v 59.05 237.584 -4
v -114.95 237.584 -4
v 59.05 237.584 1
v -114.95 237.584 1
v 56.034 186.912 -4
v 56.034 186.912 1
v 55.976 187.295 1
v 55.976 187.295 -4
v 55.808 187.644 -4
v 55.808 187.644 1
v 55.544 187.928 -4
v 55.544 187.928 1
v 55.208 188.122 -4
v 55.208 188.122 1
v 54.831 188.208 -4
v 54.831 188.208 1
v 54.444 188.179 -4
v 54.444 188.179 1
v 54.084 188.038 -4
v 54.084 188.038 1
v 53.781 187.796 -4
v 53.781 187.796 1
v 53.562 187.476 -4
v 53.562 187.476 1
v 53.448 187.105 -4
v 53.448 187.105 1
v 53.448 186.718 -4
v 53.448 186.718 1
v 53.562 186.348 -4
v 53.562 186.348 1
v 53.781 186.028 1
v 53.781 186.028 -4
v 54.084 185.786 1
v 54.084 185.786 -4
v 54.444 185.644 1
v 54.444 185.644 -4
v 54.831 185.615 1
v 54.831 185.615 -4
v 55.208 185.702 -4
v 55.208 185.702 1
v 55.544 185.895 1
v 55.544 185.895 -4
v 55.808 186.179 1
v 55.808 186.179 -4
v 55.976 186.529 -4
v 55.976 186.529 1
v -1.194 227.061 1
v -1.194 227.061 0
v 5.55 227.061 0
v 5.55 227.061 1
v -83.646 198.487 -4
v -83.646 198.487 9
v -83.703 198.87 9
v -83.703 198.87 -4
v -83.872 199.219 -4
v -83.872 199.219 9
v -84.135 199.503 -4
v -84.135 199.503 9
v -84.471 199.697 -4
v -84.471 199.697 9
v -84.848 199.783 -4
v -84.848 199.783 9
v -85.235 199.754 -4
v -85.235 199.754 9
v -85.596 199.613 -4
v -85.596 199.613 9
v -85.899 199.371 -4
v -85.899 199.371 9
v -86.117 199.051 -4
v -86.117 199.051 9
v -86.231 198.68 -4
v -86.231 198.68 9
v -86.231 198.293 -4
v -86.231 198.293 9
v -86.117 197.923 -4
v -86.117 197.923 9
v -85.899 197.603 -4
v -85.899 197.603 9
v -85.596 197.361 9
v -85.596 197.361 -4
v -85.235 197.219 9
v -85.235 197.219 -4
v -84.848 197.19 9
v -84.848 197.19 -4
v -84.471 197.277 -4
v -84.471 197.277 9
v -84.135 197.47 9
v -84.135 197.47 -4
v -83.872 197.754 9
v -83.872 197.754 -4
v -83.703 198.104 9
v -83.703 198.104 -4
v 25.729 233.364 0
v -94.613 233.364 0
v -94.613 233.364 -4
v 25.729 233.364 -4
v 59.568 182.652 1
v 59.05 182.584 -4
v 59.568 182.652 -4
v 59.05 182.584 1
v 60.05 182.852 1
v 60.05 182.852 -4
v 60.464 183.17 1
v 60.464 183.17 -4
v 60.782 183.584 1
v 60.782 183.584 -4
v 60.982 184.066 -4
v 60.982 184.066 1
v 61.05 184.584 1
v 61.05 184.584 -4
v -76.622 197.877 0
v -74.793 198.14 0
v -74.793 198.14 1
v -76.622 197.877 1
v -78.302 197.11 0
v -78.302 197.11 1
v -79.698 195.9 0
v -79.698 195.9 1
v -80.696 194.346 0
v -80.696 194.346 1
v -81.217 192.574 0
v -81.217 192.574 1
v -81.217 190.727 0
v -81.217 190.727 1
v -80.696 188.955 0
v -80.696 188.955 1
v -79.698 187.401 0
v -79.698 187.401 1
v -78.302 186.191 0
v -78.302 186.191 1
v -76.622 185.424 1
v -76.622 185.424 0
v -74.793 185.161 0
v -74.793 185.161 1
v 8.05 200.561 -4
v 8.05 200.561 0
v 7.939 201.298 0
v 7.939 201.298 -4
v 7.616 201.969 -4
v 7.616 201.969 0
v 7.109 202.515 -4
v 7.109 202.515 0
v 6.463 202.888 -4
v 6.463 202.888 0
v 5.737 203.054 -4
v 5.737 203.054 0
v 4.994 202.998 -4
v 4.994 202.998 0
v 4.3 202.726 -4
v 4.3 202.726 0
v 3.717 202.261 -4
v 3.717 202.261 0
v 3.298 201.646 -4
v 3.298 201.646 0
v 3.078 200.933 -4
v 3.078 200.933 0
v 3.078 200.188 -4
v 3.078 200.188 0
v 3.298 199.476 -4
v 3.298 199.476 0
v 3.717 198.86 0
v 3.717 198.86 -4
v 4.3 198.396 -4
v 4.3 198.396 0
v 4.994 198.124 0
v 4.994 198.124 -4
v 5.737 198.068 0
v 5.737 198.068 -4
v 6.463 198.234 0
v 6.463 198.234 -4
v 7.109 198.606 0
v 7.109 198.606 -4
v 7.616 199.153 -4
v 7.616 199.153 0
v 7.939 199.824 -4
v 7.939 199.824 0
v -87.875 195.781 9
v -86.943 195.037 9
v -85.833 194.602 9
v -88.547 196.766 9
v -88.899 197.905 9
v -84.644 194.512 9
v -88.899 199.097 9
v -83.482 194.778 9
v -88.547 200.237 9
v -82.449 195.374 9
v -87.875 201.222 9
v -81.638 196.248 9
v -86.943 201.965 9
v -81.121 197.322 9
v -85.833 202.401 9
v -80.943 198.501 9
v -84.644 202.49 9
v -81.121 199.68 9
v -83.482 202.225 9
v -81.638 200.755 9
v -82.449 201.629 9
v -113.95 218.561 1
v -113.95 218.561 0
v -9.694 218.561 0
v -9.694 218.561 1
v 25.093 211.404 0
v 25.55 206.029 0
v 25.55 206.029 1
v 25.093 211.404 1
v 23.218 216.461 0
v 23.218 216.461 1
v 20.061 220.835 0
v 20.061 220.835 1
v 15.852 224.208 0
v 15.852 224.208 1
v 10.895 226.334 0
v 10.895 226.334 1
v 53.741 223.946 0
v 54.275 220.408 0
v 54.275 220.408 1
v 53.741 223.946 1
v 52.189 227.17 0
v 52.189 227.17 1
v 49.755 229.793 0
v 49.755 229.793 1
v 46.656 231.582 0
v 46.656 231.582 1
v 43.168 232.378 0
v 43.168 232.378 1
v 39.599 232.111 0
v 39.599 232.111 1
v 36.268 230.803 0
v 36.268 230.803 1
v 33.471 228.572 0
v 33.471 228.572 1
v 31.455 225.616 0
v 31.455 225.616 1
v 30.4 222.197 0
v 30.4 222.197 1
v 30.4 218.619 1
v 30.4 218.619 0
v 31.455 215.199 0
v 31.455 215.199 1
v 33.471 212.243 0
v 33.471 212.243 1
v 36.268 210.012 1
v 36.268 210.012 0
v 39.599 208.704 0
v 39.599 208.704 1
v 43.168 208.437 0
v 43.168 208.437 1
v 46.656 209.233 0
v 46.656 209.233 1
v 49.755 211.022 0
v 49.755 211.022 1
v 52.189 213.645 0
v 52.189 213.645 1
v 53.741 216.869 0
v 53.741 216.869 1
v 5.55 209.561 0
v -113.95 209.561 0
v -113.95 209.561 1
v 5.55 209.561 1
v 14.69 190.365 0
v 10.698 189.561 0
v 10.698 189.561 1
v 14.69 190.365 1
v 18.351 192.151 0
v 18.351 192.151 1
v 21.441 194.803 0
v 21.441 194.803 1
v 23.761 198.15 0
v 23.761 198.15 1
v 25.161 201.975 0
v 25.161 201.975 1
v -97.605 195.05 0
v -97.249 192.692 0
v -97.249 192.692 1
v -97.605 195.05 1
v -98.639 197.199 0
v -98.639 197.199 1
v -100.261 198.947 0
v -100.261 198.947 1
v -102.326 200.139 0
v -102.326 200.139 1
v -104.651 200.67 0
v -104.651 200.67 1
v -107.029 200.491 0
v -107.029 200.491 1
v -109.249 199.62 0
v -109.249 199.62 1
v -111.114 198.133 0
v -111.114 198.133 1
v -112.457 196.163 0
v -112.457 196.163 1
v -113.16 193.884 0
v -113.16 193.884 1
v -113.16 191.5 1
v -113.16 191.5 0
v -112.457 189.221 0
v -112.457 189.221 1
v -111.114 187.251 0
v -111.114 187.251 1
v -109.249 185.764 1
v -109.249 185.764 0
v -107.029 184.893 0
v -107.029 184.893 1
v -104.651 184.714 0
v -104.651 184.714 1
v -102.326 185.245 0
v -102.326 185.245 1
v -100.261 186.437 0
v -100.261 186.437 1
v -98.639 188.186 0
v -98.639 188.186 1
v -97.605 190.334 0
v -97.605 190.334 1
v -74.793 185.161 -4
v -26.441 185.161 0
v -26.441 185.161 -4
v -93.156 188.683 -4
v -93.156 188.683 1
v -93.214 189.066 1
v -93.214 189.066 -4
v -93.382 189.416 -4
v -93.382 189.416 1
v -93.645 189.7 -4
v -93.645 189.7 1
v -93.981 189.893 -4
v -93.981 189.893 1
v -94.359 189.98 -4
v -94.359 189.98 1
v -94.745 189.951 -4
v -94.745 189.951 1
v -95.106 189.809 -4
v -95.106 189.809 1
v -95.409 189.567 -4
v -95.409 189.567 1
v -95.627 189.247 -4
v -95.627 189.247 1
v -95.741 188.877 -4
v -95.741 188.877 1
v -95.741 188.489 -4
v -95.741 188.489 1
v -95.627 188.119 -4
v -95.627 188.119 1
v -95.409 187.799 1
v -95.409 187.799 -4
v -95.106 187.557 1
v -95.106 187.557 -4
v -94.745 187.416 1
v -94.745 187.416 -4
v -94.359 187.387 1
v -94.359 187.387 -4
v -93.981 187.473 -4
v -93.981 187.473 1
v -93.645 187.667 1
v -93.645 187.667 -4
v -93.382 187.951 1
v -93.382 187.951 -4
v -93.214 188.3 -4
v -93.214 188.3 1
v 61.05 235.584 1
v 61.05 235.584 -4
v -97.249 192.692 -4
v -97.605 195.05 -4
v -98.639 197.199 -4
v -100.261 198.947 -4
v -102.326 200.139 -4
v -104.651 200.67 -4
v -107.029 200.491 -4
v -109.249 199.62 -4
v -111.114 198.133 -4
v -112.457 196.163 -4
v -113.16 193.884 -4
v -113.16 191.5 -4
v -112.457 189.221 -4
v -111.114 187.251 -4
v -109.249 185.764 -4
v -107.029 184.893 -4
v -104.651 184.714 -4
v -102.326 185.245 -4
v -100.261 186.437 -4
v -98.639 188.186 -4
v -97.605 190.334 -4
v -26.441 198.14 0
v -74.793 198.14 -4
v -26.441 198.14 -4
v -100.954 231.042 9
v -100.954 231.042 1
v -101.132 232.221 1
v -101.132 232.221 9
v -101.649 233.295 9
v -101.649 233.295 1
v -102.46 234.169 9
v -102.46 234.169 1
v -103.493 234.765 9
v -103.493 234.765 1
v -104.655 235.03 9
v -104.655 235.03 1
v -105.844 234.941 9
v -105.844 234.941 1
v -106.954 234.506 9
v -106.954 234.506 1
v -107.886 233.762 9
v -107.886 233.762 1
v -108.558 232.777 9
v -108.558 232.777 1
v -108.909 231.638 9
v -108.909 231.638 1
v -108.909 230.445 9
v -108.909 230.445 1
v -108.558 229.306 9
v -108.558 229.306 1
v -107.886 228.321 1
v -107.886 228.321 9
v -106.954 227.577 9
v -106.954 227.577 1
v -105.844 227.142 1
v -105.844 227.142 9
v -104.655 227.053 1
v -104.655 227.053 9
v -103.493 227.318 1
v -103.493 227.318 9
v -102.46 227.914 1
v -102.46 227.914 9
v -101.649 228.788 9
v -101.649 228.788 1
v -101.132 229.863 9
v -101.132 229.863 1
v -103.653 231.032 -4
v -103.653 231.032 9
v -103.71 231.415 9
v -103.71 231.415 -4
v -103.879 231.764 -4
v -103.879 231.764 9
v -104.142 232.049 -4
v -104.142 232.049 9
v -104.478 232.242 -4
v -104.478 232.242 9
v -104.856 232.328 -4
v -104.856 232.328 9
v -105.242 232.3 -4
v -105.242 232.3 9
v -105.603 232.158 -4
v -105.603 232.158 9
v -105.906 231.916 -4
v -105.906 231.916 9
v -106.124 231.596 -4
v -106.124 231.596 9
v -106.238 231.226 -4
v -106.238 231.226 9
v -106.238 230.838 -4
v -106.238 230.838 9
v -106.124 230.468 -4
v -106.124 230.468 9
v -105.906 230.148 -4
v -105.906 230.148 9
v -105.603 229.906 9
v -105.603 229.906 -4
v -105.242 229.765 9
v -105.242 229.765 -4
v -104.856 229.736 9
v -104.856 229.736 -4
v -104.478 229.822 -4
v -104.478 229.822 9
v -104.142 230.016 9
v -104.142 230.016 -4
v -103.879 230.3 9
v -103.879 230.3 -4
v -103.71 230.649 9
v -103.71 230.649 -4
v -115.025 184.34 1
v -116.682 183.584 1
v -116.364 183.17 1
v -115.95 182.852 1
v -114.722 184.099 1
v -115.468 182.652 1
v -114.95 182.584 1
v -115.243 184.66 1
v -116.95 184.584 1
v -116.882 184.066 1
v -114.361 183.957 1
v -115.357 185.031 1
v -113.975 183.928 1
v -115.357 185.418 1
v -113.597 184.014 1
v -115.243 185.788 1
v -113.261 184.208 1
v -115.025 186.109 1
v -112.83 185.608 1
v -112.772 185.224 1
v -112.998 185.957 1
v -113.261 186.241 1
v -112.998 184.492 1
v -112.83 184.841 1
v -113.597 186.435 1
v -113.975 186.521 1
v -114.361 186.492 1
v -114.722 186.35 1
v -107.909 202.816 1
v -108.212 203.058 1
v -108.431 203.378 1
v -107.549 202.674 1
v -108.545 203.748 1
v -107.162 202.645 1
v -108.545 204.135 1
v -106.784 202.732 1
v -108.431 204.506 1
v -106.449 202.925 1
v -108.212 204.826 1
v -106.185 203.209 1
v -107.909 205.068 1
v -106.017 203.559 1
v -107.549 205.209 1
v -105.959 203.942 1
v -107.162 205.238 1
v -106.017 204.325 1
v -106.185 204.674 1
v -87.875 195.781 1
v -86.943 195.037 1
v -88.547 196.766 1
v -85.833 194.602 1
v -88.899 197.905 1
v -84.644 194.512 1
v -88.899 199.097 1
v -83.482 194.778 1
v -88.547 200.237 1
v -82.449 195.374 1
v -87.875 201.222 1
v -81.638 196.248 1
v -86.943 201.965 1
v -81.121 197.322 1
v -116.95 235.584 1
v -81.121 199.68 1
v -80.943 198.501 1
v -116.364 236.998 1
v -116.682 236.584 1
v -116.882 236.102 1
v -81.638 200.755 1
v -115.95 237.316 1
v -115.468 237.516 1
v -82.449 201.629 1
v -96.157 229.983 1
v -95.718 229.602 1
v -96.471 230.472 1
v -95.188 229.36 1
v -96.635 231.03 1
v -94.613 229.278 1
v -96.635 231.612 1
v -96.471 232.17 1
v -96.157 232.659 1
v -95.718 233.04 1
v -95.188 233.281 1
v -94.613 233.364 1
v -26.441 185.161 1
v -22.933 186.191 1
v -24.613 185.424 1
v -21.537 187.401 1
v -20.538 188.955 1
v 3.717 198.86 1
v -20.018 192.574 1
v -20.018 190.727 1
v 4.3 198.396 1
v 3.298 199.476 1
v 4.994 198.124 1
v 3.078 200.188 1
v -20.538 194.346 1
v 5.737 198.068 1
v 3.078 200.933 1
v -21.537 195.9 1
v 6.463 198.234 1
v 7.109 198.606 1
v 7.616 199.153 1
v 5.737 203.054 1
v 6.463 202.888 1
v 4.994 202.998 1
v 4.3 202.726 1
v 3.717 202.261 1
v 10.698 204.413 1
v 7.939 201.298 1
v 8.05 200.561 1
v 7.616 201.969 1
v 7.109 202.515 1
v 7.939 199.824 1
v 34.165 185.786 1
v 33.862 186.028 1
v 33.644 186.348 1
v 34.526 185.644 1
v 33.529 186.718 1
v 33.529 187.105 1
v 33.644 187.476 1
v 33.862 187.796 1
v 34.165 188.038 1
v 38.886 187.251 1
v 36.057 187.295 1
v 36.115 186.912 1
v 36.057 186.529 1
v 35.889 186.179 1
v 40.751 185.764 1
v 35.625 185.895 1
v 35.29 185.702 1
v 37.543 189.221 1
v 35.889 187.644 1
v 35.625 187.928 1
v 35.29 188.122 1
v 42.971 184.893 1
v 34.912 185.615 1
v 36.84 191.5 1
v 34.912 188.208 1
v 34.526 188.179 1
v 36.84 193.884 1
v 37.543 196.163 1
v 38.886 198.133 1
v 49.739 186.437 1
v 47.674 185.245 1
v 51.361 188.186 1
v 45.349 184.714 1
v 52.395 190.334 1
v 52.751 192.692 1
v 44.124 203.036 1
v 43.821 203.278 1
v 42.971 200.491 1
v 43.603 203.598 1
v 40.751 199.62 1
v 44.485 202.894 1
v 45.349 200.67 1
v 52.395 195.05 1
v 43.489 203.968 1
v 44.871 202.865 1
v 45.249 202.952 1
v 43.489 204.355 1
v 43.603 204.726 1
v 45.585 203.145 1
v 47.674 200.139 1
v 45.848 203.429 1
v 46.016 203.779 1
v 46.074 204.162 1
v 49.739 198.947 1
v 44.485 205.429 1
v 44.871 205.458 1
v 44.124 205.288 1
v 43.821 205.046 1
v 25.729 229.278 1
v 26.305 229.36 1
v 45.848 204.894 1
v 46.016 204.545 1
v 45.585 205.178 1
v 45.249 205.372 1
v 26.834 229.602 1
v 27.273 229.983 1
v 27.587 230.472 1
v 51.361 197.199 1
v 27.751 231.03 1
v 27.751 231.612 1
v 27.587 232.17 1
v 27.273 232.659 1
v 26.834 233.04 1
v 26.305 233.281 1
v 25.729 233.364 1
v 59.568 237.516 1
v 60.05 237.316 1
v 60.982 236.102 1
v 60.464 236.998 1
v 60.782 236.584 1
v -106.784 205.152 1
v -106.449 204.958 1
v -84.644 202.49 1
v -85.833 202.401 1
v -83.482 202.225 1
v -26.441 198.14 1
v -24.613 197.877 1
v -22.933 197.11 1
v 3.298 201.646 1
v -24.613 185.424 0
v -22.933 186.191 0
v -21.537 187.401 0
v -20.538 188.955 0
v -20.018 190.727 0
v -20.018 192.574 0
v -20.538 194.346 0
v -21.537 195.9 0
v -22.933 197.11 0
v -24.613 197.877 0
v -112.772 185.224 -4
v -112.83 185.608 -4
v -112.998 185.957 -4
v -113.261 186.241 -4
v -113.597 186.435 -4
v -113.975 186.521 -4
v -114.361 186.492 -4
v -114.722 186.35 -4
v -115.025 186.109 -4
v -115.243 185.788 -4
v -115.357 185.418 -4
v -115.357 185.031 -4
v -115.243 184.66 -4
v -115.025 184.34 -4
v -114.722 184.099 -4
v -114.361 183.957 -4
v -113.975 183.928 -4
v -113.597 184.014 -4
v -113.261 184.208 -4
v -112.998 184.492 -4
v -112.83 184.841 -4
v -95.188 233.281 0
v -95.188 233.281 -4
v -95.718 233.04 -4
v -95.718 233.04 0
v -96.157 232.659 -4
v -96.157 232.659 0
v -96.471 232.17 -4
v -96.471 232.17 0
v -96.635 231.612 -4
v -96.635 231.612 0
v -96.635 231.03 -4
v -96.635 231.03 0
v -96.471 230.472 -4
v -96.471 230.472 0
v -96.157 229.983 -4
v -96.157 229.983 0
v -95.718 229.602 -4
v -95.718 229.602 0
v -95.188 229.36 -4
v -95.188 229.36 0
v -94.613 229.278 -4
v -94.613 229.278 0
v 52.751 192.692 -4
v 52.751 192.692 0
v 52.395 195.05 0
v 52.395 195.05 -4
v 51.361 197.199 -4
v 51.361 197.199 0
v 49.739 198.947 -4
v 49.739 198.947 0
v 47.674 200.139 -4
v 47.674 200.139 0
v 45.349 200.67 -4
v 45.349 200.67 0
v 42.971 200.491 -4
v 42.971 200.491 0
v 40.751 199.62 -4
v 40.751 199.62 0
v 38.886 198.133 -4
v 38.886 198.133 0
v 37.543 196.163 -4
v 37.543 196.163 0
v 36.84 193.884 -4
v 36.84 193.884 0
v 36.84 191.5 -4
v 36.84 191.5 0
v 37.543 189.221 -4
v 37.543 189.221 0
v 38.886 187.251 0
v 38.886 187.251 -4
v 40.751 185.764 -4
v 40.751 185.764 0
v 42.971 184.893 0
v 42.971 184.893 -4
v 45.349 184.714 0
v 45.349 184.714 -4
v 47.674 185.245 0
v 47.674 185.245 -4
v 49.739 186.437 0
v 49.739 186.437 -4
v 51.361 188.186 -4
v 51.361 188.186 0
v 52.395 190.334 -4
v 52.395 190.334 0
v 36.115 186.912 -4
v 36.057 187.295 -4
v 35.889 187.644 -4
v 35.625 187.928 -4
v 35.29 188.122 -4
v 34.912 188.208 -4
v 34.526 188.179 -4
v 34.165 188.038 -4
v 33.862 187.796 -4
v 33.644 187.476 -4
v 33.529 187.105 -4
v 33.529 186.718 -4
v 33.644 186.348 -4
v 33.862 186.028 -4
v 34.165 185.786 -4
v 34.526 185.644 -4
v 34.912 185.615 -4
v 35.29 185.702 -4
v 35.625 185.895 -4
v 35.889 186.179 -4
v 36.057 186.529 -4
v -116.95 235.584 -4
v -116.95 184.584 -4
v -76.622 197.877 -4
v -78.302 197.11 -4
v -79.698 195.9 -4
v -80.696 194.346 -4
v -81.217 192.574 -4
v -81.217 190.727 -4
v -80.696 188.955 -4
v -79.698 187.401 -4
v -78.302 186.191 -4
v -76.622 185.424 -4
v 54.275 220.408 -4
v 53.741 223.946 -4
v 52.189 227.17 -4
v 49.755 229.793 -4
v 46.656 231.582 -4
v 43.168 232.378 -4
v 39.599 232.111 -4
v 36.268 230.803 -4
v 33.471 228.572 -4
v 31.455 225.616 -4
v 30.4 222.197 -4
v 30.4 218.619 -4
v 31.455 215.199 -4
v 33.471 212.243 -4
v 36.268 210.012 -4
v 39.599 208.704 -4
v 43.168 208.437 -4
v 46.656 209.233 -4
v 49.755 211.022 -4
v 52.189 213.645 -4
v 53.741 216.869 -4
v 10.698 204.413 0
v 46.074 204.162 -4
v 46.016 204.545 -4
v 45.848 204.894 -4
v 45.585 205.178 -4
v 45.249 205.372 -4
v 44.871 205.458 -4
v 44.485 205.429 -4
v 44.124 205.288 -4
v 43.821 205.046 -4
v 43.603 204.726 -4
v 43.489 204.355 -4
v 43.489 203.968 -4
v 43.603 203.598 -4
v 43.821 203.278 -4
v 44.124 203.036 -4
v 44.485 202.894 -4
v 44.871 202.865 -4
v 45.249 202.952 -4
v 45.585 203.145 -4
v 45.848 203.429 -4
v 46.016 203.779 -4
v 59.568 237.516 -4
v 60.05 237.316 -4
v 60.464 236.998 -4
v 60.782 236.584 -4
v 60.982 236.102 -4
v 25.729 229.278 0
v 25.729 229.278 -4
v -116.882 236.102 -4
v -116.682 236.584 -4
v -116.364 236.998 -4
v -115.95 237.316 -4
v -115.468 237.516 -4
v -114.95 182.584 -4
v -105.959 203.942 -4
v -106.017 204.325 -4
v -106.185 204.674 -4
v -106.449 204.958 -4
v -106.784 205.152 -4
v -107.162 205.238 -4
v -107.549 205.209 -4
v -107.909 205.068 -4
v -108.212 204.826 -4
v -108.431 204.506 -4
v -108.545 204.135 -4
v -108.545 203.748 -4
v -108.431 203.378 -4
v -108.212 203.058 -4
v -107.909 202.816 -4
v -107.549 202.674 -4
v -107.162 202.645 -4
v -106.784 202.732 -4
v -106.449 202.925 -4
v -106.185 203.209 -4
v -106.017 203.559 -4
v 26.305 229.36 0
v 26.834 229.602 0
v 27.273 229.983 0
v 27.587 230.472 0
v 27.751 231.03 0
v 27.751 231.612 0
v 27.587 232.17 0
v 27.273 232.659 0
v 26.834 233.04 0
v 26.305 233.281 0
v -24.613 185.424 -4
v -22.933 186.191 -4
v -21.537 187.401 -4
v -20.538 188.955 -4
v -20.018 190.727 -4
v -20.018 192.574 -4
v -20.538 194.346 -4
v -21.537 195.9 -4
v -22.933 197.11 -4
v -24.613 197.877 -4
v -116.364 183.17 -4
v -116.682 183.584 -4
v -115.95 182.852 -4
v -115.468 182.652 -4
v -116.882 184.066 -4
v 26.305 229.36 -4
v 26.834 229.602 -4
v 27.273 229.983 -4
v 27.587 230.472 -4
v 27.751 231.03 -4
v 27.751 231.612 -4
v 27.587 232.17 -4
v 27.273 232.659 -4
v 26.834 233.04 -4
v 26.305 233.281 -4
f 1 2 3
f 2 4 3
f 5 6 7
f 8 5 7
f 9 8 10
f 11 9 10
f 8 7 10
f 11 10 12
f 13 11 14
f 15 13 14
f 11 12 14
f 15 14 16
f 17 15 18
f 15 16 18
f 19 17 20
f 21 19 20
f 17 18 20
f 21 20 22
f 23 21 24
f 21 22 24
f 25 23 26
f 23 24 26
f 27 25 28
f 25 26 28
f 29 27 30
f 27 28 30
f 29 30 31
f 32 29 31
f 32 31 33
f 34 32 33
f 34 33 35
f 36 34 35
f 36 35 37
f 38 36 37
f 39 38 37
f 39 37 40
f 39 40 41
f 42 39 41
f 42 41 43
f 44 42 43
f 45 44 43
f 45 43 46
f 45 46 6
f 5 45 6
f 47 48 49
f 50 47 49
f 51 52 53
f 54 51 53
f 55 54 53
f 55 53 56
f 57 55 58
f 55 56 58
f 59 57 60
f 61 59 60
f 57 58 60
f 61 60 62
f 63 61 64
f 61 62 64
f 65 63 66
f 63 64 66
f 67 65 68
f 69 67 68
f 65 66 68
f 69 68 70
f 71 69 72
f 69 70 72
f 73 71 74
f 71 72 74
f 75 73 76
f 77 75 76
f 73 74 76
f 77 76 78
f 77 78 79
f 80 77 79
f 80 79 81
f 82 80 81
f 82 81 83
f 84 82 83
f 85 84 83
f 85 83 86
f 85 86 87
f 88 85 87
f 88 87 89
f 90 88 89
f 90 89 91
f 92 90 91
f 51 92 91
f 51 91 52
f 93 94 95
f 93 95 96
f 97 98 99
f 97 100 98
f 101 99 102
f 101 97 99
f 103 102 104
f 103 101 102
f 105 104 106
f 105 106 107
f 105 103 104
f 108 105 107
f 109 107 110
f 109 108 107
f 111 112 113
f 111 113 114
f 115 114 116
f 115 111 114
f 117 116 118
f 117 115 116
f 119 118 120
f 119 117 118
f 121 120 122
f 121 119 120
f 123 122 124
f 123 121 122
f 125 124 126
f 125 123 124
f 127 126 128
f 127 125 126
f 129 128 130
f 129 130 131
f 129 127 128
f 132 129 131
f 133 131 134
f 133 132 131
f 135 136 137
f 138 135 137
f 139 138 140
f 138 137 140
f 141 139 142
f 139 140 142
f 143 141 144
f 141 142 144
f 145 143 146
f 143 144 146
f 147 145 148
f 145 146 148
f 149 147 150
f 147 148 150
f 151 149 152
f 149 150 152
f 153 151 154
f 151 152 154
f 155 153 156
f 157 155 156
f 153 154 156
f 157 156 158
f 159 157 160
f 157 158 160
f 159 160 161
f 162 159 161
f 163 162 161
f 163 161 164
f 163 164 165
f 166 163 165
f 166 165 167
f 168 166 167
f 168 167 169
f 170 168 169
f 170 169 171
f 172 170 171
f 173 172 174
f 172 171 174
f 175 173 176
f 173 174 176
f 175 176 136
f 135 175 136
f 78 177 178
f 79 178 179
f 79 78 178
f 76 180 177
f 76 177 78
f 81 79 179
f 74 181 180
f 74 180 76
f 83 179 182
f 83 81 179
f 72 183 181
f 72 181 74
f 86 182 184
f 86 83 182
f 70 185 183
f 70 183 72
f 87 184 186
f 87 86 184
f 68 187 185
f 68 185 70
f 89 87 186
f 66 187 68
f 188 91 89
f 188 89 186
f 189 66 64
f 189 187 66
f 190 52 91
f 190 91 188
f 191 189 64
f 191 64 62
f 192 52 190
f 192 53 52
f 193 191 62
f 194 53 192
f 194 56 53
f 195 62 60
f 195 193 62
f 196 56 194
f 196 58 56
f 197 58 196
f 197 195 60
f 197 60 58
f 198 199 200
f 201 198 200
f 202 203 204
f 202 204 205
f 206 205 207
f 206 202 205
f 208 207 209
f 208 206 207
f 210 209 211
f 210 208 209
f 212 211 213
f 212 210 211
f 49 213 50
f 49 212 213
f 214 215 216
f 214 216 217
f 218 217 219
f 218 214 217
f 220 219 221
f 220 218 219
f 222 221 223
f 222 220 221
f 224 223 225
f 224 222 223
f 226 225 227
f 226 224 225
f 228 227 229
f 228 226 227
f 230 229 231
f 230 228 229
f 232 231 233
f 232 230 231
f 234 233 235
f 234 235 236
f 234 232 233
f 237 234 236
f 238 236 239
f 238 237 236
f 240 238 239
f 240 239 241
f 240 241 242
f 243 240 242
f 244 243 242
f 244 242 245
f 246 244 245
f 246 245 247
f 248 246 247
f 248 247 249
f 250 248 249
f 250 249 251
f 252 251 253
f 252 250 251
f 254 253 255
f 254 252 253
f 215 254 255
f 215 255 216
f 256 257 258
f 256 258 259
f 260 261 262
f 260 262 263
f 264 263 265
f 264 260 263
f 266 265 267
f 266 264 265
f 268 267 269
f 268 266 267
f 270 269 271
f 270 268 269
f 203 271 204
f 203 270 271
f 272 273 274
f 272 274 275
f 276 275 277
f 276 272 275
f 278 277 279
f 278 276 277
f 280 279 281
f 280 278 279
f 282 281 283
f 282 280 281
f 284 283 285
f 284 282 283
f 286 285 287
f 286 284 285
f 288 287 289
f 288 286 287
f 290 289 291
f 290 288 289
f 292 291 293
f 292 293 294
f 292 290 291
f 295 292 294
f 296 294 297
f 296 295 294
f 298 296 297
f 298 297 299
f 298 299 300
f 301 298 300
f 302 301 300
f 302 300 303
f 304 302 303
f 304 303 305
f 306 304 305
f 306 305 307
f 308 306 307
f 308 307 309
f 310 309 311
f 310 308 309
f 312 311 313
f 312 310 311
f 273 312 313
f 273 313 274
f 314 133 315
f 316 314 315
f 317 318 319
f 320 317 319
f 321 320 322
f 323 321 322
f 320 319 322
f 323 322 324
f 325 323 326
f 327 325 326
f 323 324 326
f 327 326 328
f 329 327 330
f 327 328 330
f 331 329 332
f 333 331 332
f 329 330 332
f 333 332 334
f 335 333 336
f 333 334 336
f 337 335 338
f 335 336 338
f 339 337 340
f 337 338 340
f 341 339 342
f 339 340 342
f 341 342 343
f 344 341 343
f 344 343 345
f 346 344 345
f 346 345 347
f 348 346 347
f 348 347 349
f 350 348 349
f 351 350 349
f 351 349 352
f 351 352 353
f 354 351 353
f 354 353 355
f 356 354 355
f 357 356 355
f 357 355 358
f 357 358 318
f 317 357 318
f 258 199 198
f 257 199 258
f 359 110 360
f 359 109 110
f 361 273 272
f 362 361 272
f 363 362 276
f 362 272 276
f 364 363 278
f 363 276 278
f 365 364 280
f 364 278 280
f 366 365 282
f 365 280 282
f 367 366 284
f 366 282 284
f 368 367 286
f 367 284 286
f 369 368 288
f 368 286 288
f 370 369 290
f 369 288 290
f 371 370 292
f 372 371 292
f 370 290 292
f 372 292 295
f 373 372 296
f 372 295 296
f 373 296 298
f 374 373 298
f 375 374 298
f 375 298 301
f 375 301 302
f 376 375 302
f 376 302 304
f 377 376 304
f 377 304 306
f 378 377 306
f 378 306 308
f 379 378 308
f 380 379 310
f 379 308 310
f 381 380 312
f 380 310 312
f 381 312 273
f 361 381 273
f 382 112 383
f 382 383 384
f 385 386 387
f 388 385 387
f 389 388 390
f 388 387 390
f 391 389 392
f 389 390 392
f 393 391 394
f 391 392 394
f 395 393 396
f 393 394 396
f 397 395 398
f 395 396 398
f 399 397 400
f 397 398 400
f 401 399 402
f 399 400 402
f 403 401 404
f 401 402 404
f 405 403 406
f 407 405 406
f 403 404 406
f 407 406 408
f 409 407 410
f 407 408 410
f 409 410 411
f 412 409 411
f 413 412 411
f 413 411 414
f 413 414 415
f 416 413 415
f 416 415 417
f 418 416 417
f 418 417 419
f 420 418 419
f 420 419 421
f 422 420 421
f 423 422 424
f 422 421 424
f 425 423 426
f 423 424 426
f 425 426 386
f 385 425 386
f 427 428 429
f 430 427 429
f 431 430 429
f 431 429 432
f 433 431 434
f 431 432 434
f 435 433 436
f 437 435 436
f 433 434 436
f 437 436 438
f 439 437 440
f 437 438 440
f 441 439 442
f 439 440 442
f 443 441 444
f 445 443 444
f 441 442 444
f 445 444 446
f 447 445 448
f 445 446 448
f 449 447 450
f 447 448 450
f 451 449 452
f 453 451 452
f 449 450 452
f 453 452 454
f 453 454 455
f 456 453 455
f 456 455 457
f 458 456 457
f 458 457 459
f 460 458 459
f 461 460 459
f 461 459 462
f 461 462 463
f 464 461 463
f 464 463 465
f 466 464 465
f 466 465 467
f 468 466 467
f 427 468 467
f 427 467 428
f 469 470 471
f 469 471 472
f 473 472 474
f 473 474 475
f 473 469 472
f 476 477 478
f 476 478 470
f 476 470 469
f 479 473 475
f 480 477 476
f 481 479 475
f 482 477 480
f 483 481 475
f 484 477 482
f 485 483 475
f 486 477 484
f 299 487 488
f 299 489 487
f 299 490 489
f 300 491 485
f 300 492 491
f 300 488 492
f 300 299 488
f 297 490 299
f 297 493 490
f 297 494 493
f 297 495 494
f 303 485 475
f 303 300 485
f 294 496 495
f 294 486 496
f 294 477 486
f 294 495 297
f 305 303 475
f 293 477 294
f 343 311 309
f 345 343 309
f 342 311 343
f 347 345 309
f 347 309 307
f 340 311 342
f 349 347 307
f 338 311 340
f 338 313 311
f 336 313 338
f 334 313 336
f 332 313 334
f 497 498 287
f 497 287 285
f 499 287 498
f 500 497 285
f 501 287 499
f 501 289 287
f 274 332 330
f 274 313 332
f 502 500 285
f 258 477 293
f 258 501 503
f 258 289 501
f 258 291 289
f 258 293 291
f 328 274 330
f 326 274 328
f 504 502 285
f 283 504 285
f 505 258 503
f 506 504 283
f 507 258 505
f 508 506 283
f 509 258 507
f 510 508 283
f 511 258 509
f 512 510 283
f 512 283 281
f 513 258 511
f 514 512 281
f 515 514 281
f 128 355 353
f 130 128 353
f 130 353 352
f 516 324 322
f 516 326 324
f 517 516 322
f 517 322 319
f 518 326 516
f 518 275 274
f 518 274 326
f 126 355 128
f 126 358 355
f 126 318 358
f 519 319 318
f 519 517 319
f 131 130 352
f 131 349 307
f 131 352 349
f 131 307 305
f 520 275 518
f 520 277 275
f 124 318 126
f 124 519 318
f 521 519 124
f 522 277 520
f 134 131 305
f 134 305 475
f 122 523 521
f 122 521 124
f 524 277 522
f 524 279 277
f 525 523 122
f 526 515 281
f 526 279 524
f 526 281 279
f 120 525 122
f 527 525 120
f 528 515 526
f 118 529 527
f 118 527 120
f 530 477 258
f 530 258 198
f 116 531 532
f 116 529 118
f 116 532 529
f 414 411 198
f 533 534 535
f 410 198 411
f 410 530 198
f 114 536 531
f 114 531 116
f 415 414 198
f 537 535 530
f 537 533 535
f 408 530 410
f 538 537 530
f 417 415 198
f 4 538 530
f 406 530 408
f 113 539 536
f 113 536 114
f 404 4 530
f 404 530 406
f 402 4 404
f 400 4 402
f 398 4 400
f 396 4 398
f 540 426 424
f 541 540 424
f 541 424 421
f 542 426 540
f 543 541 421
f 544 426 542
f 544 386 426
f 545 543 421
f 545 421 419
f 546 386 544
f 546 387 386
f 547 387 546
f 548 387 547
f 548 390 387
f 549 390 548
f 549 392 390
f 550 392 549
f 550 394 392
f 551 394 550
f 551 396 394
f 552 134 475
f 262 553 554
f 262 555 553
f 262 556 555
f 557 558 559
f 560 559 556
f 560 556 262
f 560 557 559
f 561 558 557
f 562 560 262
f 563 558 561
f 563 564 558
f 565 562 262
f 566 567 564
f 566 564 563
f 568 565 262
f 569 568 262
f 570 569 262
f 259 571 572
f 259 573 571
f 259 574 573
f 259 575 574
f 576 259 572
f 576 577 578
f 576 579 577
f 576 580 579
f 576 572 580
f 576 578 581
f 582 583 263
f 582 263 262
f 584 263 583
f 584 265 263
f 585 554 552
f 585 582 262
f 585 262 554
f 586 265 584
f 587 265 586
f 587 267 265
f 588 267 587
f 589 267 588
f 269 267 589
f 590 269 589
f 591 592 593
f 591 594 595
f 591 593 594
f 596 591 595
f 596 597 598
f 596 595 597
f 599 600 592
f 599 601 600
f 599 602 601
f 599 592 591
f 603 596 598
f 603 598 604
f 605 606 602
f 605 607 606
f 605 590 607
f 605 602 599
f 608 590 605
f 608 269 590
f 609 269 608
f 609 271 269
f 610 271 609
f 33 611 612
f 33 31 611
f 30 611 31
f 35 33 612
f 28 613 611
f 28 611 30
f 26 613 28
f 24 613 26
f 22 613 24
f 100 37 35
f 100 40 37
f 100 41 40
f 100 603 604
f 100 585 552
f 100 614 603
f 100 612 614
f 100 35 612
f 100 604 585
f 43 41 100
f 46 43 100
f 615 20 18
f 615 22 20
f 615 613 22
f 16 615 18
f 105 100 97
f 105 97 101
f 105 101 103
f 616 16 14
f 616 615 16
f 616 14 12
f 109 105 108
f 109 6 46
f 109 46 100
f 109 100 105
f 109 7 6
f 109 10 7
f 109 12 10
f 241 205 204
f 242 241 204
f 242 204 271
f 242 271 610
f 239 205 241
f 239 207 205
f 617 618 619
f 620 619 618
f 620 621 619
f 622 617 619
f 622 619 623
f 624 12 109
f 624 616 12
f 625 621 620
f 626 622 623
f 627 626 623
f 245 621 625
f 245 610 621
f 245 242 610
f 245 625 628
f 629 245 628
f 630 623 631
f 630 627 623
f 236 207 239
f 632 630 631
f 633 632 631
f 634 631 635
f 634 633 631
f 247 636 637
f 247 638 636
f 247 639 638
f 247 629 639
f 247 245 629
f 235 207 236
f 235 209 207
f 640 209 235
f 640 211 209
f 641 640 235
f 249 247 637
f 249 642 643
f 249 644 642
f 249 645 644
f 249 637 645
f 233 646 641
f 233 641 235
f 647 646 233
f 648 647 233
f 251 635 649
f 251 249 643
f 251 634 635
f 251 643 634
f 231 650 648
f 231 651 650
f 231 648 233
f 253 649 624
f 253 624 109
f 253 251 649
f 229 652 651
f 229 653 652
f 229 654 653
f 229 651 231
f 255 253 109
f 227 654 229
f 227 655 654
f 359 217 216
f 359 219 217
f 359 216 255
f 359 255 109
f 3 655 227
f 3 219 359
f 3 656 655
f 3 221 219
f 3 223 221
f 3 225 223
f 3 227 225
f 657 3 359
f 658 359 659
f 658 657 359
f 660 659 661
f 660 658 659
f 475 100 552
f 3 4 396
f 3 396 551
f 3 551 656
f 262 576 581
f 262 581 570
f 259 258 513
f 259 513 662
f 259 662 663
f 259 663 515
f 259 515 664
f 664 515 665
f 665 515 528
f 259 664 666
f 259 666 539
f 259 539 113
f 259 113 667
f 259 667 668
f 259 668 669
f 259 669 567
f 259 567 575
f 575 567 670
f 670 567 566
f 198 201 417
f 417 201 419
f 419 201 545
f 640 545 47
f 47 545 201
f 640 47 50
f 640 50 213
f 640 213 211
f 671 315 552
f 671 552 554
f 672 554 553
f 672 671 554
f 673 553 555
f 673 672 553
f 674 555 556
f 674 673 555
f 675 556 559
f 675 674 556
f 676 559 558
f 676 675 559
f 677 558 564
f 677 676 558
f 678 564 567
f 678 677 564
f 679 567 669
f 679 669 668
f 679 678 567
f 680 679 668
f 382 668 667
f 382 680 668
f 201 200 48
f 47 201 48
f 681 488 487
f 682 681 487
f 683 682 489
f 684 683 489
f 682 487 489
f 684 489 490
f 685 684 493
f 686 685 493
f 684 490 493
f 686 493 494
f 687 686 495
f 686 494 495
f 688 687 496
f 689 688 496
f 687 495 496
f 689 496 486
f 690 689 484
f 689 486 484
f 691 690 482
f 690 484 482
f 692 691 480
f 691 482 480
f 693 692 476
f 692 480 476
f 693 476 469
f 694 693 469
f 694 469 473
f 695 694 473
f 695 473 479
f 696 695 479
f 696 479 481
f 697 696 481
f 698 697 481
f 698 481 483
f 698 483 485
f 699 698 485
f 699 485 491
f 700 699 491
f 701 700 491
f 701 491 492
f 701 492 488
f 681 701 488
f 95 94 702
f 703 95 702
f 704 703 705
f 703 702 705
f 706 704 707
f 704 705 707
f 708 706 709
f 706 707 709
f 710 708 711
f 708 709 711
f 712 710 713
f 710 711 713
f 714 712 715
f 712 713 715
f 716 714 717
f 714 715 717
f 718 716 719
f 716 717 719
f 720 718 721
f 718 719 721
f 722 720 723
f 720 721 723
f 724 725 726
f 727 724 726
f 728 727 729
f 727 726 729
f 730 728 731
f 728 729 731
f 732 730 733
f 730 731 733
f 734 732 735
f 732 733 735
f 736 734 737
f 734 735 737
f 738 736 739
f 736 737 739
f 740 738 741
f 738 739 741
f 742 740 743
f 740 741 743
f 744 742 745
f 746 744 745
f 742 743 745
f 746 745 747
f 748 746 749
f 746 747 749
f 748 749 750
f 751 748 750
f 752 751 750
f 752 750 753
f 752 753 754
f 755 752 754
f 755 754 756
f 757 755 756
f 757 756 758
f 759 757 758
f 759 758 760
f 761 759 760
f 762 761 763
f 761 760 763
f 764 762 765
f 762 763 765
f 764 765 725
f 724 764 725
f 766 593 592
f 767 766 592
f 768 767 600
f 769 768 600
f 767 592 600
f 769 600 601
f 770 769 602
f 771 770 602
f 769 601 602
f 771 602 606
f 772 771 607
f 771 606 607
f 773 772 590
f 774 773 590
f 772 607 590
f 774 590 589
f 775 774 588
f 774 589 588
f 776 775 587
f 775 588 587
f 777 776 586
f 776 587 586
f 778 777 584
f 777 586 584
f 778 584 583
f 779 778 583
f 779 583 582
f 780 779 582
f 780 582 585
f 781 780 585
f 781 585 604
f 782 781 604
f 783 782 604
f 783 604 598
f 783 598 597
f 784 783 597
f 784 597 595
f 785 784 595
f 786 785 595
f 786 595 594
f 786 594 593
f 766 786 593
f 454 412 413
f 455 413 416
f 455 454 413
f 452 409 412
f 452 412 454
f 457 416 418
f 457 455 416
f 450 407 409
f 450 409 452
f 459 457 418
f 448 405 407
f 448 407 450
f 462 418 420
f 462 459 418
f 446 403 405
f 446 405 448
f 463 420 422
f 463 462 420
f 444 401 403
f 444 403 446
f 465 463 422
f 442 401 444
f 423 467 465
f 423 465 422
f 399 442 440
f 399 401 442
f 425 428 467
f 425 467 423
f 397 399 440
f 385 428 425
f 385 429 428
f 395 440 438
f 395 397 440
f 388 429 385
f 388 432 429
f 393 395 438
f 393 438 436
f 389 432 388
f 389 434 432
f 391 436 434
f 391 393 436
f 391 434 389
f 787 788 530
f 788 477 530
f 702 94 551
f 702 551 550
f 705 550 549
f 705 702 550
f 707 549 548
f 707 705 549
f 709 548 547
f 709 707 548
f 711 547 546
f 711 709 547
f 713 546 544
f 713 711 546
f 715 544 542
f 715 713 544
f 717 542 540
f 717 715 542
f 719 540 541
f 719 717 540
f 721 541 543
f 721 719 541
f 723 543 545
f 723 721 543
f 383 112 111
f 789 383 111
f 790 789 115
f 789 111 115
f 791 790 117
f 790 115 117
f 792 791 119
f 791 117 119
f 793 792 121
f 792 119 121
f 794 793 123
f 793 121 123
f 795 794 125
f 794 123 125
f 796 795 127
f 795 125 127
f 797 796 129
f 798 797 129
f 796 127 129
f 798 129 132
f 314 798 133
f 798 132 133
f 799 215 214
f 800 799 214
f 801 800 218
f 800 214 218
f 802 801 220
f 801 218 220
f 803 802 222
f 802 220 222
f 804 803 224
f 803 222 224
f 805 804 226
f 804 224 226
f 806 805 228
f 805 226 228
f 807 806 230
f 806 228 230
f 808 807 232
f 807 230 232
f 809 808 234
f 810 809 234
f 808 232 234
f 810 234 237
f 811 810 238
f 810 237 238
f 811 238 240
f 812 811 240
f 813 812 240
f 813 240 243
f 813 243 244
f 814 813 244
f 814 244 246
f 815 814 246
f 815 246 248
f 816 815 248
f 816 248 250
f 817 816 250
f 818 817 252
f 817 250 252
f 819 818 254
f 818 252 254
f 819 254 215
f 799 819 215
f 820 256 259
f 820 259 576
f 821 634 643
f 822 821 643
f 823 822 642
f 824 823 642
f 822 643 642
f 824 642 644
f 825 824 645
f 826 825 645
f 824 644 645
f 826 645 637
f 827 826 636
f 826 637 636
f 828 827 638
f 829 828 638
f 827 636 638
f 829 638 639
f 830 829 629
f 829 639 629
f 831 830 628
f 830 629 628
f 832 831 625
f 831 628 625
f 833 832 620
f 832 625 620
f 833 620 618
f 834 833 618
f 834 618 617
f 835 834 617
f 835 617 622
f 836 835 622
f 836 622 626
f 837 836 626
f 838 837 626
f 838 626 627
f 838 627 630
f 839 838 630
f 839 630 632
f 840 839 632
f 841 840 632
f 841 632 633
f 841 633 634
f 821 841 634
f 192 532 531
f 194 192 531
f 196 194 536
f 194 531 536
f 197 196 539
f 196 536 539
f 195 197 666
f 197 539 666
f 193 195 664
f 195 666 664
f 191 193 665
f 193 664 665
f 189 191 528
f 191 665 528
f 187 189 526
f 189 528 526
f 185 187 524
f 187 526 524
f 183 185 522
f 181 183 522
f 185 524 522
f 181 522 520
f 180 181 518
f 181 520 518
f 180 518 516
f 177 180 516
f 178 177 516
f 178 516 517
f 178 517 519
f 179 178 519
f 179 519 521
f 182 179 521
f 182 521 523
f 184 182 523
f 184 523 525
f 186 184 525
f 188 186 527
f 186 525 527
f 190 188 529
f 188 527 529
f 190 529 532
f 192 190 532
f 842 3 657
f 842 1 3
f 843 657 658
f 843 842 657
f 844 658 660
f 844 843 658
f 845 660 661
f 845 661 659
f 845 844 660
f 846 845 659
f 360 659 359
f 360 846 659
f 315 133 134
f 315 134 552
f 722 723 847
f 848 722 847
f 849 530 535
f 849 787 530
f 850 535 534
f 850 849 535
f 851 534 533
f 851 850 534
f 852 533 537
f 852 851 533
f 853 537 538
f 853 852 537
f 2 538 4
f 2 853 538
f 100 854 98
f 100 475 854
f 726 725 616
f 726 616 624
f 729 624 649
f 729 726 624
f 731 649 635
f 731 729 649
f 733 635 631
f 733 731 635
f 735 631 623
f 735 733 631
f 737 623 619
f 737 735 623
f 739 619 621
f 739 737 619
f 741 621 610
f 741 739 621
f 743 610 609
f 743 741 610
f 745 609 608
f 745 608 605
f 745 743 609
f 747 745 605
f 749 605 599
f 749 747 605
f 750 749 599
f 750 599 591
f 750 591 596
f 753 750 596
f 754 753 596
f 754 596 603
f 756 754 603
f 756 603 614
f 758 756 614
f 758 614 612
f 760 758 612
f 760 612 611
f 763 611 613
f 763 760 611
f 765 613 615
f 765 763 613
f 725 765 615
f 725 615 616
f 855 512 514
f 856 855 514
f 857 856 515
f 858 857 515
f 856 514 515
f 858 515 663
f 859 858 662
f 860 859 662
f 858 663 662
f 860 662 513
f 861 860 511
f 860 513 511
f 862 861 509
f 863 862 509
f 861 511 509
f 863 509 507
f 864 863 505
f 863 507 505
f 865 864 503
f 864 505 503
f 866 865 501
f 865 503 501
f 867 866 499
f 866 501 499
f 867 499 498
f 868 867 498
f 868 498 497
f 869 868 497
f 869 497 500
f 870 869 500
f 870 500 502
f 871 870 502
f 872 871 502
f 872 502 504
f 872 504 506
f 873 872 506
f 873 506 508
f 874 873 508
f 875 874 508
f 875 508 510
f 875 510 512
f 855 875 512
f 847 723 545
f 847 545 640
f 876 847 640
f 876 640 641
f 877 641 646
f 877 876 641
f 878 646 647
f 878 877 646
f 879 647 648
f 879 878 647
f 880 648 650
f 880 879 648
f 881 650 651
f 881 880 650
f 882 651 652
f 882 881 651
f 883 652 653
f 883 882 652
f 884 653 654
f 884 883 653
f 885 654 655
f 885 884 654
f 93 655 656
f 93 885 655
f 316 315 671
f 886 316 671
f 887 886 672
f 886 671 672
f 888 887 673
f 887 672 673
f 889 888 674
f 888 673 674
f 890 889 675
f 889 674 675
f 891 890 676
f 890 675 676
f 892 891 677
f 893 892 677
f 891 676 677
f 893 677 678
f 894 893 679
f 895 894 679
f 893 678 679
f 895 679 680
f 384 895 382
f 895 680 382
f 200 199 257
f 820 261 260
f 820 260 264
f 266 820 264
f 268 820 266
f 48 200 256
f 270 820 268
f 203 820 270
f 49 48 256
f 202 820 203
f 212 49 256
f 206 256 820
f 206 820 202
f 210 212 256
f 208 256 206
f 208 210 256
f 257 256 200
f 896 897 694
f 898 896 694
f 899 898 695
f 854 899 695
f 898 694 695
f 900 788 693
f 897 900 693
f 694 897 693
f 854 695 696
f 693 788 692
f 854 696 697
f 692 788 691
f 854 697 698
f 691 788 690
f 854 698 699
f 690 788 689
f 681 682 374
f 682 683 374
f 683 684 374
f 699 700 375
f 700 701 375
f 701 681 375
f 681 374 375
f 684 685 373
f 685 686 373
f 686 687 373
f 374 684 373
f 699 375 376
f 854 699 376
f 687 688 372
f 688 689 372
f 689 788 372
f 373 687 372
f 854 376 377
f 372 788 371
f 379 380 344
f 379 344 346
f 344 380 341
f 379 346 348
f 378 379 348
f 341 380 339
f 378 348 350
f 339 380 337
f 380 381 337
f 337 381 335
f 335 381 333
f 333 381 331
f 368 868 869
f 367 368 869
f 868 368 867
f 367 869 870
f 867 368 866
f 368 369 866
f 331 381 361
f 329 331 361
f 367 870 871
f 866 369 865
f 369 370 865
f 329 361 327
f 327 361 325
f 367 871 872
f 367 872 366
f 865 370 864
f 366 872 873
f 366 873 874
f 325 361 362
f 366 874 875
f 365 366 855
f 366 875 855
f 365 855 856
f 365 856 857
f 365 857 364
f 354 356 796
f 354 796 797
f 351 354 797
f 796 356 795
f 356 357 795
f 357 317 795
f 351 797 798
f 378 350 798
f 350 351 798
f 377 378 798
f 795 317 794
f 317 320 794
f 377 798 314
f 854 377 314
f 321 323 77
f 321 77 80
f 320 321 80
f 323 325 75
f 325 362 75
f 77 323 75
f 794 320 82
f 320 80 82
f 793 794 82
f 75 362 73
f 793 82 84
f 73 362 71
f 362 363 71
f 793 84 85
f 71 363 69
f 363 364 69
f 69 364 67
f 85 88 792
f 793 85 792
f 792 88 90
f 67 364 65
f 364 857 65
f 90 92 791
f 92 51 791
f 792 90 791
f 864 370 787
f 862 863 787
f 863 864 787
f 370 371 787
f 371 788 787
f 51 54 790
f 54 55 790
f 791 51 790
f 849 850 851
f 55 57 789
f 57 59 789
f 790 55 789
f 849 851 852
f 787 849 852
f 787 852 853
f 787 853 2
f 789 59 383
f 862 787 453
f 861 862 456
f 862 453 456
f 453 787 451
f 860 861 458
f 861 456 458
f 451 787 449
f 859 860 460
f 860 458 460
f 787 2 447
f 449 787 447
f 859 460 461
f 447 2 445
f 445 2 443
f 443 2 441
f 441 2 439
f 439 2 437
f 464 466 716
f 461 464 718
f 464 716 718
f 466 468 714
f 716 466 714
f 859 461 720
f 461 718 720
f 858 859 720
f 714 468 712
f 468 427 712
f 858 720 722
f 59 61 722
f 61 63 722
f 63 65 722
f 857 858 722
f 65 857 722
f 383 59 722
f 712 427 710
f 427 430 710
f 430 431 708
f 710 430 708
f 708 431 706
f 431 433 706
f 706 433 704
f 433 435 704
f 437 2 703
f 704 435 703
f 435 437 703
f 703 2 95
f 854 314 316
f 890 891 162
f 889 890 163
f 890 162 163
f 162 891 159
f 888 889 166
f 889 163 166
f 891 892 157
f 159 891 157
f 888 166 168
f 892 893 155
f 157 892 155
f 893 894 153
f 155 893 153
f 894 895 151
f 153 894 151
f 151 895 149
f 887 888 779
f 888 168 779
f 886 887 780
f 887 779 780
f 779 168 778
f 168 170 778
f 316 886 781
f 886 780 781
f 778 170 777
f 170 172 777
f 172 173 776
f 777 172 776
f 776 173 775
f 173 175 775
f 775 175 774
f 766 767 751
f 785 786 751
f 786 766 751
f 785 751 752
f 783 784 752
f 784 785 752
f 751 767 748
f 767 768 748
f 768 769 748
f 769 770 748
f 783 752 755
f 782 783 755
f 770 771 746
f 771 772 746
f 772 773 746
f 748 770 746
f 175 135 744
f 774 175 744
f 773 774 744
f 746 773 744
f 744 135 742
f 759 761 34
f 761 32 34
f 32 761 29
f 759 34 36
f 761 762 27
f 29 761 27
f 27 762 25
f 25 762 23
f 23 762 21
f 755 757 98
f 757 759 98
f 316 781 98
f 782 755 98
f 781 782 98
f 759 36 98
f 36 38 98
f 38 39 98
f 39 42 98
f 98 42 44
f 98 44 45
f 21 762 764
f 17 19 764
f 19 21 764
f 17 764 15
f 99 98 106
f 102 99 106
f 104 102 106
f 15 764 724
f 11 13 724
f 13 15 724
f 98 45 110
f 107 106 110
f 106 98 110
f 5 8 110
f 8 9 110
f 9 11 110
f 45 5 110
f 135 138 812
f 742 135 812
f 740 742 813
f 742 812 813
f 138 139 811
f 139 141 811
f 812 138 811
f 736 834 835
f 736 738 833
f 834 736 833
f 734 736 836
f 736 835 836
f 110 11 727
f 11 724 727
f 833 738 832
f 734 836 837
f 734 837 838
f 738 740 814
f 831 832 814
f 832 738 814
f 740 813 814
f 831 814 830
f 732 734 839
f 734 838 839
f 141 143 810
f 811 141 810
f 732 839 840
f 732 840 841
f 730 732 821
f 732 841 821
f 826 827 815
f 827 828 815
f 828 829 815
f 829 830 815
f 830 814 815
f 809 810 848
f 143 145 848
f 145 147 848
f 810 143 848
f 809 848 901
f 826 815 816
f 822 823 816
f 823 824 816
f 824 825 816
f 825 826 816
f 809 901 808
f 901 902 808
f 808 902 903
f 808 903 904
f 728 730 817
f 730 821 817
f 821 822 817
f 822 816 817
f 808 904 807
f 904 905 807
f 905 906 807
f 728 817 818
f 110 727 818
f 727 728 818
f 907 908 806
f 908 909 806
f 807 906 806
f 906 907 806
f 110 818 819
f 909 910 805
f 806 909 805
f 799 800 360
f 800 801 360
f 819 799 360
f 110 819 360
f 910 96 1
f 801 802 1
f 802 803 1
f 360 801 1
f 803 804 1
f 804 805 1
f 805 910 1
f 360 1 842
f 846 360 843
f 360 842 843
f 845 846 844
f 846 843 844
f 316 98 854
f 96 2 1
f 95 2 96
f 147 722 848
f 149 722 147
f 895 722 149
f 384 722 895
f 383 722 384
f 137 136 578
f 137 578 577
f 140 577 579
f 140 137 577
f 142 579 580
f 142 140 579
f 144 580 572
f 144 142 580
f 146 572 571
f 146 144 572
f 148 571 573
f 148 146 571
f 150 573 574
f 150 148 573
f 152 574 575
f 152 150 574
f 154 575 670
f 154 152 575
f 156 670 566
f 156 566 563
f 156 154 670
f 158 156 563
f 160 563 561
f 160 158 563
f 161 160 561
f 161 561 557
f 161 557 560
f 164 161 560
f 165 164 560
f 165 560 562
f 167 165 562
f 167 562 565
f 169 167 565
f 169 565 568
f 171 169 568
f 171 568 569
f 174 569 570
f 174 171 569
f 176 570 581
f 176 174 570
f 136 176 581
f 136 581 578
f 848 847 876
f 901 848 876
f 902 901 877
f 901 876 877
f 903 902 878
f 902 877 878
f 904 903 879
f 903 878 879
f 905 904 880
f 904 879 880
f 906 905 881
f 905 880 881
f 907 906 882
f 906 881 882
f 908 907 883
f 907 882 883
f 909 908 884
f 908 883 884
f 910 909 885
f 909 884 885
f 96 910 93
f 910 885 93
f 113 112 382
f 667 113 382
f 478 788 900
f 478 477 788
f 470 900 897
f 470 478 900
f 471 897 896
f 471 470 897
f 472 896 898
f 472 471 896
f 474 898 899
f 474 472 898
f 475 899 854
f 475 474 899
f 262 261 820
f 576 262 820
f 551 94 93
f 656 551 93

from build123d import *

# Parameters (mm, degrees)
SKETCH001_W     = 178
SKETCH001_H     = 55
SKETCH001_R     = 2.5
SKETCH001_R_2   = 8
SKETCH001_R_3   = 12.004096
PAD_DEPTH       = 1
SKETCH004_R     = 1.3
POCKET_DEPTH    = 9
SKETCH003_R     = 4
PAD001_DEPTH    = 8
SKETCH006_W     = 178
SKETCH006_H     = 55
SKETCH006_R     = 2.5
SKETCH006_R_2   = 8
SKETCH006_R_3   = 12.004096
PAD002_DEPTH    = 4
SKETCH_R        = 1.3
POCKET001_DEPTH = 13.001
SKETCH007_R     = 1.3
POCKET002_DEPTH = 5.001
FILLET_R        = 2


with BuildPart() as part:
    # Sketch001 → Pad (new body)
    with BuildSketch(Plane.XY):
        with Locations((-27.95005, 210.084131)):
            Rectangle(SKETCH001_W, SKETCH001_H)
        with Locations((5.54995, 200.560838)):
            Circle(SKETCH001_R, mode=Mode.SUBTRACT)
        with Locations((-105.249172, 192.692063)):
            Circle(SKETCH001_R_2, mode=Mode.SUBTRACT)
        with Locations((44.750828, 192.692063)):
            Circle(SKETCH001_R_2, mode=Mode.SUBTRACT)
        with Locations((42.270485, 220.407623)):
            Circle(SKETCH001_R_3, mode=Mode.SUBTRACT)
        with BuildLine():
            ThreePointArc((25.54995, 206.028969), (20.061493, 220.835101), (5.54995, 227.060838))
            Line((-1.19441, 227.060838), (5.54995, 227.060838))
            Line((-9.694456, 218.560838), (-1.19441, 227.060838))
            Line((-113.95005, 218.561117), (-9.694456, 218.560838))
            Line((-113.95005, 218.561117), (-113.95005, 209.560838))
            Line((-113.95005, 209.560838), (-9.618024, 209.560838))
            Line((-9.618024, 209.560838), (5.54995, 209.560838))
            Line((5.54995, 209.560838), (10.697892, 204.412896))
            Line((10.697892, 189.560838), (10.697892, 204.412896))
            ThreePointArc((10.697892, 189.560838), (21.441031, 194.803313), (25.54995, 206.028969))
        make_face(mode=Mode.SUBTRACT)
        with BuildLine():
            ThreePointArc((-74.793427, 198.14003), (-81.282837, 191.65062), (-74.793427, 185.16121))
            Line((-74.793427, 185.16121), (-26.440948, 185.16121))
            ThreePointArc((-26.440948, 185.16121), (-19.951538, 191.65062), (-26.440948, 198.14003))
            Line((-74.793427, 198.14003), (-26.440948, 198.14003))
        make_face(mode=Mode.SUBTRACT)
        with BuildLine():
            ThreePointArc((-94.612823, 233.364261), (-96.6561, 231.320984), (-94.612823, 229.277707))
            Line((-94.612823, 229.277707), (25.728859, 229.277707))
            ThreePointArc((25.728859, 229.277707), (27.772136, 231.320984), (25.728859, 233.364261))
            Line((-94.612823, 233.364261), (25.728859, 233.364261))
        make_face(mode=Mode.SUBTRACT)
    extrude(amount=PAD_DEPTH)

    # Sketch004 → Pocket (cut)
    with BuildSketch(Plane.XY.offset(10)):
        with Locations((-84.917816, 197.526398)):
            Circle(SKETCH004_R)
        with Locations((-104.937256, 231.505722)):
            Circle(SKETCH004_R)
    extrude(amount=-POCKET_DEPTH, mode=Mode.SUBTRACT)

    # Sketch003 (on Face28 of Pad) → Pad001 (join)
    with BuildSketch(Plane.XY.offset(1)):
        with Locations((-84.943253, 198.501221)):
            Circle(SKETCH003_R)
        with Locations((-104.954079, 231.041534)):
            Circle(SKETCH003_R)
    extrude(amount=PAD001_DEPTH)

    # Sketch006 → Pad002 (join)
    with BuildSketch(Plane.XY):
        with Locations((-27.95005, 210.084131)):
            Rectangle(SKETCH006_W, SKETCH006_H)
        with Locations((5.54995, 200.560838)):
            Circle(SKETCH006_R, mode=Mode.SUBTRACT)
        with Locations((-105.249172, 192.692063)):
            Circle(SKETCH006_R_2, mode=Mode.SUBTRACT)
        with Locations((44.750828, 192.692063)):
            Circle(SKETCH006_R_2, mode=Mode.SUBTRACT)
        with Locations((42.270485, 220.407623)):
            Circle(SKETCH006_R_3, mode=Mode.SUBTRACT)
        with BuildLine():
            ThreePointArc((-74.793427, 198.14003), (-81.282837, 191.65062), (-74.793427, 185.16121))
            Line((-74.793427, 185.16121), (-26.440948, 185.16121))
            ThreePointArc((-26.440948, 185.16121), (-19.951538, 191.65062), (-26.440948, 198.14003))
            Line((-74.793427, 198.14003), (-26.440948, 198.14003))
        make_face(mode=Mode.SUBTRACT)
        with BuildLine():
            ThreePointArc((-94.612823, 233.364261), (-96.6561, 231.320984), (-94.612823, 229.277707))
            Line((-94.612823, 229.277707), (25.728859, 229.277707))
            ThreePointArc((25.728859, 229.277707), (27.772136, 231.320984), (25.728859, 233.364261))
            Line((-94.612823, 233.364261), (25.728859, 233.364261))
        make_face(mode=Mode.SUBTRACT)
    extrude(amount=-PAD002_DEPTH)

    # Sketch (on Face48 of Pad002) → Pocket001 (cut, through all)
    with BuildSketch(Plane.XY.offset(9)):
        with Locations((-84.945648, 198.486725)):
            Circle(SKETCH_R)
        with Locations((-104.952744, 231.032135)):
            Circle(SKETCH_R)
    extrude(amount=-POCKET001_DEPTH, mode=Mode.SUBTRACT)

    # Sketch007 → Pocket002 (cut, through all)
    with BuildSketch(Plane.XY.offset(1)):
        with Locations((44.774215, 204.16173)):
            Circle(SKETCH007_R)
        with Locations((34.814923, 186.91173)):
            Circle(SKETCH007_R)
        with Locations((54.733507, 186.91173)):
            Circle(SKETCH007_R)
        with Locations((-107.25934, 203.941744)):
            Circle(SKETCH007_R)
        with Locations((-114.071897, 185.224398)):
            Circle(SKETCH007_R)
        with Locations((-94.455921, 188.683224)):
            Circle(SKETCH007_R)
    extrude(amount=-POCKET002_DEPTH, mode=Mode.SUBTRACT)

    # Fillet
    fillet_edges = [part.edges().sort_by_distance(p)[0] for p in [
        (-116.95005, 237.584131, -2),
        (-116.95005, 237.584131, 0.5),
        (61.04995, 237.584131, -2),
        (61.04995, 237.584131, 0.5),
        (61.04995, 182.584131, -2),
        (61.04995, 182.584131, 0.5),
        (-116.95005, 182.584131, -2),
        (-116.95005, 182.584131, 0.5),
    ]]
    fillet(fillet_edges, radius=FILLET_R)


solid = part.part
